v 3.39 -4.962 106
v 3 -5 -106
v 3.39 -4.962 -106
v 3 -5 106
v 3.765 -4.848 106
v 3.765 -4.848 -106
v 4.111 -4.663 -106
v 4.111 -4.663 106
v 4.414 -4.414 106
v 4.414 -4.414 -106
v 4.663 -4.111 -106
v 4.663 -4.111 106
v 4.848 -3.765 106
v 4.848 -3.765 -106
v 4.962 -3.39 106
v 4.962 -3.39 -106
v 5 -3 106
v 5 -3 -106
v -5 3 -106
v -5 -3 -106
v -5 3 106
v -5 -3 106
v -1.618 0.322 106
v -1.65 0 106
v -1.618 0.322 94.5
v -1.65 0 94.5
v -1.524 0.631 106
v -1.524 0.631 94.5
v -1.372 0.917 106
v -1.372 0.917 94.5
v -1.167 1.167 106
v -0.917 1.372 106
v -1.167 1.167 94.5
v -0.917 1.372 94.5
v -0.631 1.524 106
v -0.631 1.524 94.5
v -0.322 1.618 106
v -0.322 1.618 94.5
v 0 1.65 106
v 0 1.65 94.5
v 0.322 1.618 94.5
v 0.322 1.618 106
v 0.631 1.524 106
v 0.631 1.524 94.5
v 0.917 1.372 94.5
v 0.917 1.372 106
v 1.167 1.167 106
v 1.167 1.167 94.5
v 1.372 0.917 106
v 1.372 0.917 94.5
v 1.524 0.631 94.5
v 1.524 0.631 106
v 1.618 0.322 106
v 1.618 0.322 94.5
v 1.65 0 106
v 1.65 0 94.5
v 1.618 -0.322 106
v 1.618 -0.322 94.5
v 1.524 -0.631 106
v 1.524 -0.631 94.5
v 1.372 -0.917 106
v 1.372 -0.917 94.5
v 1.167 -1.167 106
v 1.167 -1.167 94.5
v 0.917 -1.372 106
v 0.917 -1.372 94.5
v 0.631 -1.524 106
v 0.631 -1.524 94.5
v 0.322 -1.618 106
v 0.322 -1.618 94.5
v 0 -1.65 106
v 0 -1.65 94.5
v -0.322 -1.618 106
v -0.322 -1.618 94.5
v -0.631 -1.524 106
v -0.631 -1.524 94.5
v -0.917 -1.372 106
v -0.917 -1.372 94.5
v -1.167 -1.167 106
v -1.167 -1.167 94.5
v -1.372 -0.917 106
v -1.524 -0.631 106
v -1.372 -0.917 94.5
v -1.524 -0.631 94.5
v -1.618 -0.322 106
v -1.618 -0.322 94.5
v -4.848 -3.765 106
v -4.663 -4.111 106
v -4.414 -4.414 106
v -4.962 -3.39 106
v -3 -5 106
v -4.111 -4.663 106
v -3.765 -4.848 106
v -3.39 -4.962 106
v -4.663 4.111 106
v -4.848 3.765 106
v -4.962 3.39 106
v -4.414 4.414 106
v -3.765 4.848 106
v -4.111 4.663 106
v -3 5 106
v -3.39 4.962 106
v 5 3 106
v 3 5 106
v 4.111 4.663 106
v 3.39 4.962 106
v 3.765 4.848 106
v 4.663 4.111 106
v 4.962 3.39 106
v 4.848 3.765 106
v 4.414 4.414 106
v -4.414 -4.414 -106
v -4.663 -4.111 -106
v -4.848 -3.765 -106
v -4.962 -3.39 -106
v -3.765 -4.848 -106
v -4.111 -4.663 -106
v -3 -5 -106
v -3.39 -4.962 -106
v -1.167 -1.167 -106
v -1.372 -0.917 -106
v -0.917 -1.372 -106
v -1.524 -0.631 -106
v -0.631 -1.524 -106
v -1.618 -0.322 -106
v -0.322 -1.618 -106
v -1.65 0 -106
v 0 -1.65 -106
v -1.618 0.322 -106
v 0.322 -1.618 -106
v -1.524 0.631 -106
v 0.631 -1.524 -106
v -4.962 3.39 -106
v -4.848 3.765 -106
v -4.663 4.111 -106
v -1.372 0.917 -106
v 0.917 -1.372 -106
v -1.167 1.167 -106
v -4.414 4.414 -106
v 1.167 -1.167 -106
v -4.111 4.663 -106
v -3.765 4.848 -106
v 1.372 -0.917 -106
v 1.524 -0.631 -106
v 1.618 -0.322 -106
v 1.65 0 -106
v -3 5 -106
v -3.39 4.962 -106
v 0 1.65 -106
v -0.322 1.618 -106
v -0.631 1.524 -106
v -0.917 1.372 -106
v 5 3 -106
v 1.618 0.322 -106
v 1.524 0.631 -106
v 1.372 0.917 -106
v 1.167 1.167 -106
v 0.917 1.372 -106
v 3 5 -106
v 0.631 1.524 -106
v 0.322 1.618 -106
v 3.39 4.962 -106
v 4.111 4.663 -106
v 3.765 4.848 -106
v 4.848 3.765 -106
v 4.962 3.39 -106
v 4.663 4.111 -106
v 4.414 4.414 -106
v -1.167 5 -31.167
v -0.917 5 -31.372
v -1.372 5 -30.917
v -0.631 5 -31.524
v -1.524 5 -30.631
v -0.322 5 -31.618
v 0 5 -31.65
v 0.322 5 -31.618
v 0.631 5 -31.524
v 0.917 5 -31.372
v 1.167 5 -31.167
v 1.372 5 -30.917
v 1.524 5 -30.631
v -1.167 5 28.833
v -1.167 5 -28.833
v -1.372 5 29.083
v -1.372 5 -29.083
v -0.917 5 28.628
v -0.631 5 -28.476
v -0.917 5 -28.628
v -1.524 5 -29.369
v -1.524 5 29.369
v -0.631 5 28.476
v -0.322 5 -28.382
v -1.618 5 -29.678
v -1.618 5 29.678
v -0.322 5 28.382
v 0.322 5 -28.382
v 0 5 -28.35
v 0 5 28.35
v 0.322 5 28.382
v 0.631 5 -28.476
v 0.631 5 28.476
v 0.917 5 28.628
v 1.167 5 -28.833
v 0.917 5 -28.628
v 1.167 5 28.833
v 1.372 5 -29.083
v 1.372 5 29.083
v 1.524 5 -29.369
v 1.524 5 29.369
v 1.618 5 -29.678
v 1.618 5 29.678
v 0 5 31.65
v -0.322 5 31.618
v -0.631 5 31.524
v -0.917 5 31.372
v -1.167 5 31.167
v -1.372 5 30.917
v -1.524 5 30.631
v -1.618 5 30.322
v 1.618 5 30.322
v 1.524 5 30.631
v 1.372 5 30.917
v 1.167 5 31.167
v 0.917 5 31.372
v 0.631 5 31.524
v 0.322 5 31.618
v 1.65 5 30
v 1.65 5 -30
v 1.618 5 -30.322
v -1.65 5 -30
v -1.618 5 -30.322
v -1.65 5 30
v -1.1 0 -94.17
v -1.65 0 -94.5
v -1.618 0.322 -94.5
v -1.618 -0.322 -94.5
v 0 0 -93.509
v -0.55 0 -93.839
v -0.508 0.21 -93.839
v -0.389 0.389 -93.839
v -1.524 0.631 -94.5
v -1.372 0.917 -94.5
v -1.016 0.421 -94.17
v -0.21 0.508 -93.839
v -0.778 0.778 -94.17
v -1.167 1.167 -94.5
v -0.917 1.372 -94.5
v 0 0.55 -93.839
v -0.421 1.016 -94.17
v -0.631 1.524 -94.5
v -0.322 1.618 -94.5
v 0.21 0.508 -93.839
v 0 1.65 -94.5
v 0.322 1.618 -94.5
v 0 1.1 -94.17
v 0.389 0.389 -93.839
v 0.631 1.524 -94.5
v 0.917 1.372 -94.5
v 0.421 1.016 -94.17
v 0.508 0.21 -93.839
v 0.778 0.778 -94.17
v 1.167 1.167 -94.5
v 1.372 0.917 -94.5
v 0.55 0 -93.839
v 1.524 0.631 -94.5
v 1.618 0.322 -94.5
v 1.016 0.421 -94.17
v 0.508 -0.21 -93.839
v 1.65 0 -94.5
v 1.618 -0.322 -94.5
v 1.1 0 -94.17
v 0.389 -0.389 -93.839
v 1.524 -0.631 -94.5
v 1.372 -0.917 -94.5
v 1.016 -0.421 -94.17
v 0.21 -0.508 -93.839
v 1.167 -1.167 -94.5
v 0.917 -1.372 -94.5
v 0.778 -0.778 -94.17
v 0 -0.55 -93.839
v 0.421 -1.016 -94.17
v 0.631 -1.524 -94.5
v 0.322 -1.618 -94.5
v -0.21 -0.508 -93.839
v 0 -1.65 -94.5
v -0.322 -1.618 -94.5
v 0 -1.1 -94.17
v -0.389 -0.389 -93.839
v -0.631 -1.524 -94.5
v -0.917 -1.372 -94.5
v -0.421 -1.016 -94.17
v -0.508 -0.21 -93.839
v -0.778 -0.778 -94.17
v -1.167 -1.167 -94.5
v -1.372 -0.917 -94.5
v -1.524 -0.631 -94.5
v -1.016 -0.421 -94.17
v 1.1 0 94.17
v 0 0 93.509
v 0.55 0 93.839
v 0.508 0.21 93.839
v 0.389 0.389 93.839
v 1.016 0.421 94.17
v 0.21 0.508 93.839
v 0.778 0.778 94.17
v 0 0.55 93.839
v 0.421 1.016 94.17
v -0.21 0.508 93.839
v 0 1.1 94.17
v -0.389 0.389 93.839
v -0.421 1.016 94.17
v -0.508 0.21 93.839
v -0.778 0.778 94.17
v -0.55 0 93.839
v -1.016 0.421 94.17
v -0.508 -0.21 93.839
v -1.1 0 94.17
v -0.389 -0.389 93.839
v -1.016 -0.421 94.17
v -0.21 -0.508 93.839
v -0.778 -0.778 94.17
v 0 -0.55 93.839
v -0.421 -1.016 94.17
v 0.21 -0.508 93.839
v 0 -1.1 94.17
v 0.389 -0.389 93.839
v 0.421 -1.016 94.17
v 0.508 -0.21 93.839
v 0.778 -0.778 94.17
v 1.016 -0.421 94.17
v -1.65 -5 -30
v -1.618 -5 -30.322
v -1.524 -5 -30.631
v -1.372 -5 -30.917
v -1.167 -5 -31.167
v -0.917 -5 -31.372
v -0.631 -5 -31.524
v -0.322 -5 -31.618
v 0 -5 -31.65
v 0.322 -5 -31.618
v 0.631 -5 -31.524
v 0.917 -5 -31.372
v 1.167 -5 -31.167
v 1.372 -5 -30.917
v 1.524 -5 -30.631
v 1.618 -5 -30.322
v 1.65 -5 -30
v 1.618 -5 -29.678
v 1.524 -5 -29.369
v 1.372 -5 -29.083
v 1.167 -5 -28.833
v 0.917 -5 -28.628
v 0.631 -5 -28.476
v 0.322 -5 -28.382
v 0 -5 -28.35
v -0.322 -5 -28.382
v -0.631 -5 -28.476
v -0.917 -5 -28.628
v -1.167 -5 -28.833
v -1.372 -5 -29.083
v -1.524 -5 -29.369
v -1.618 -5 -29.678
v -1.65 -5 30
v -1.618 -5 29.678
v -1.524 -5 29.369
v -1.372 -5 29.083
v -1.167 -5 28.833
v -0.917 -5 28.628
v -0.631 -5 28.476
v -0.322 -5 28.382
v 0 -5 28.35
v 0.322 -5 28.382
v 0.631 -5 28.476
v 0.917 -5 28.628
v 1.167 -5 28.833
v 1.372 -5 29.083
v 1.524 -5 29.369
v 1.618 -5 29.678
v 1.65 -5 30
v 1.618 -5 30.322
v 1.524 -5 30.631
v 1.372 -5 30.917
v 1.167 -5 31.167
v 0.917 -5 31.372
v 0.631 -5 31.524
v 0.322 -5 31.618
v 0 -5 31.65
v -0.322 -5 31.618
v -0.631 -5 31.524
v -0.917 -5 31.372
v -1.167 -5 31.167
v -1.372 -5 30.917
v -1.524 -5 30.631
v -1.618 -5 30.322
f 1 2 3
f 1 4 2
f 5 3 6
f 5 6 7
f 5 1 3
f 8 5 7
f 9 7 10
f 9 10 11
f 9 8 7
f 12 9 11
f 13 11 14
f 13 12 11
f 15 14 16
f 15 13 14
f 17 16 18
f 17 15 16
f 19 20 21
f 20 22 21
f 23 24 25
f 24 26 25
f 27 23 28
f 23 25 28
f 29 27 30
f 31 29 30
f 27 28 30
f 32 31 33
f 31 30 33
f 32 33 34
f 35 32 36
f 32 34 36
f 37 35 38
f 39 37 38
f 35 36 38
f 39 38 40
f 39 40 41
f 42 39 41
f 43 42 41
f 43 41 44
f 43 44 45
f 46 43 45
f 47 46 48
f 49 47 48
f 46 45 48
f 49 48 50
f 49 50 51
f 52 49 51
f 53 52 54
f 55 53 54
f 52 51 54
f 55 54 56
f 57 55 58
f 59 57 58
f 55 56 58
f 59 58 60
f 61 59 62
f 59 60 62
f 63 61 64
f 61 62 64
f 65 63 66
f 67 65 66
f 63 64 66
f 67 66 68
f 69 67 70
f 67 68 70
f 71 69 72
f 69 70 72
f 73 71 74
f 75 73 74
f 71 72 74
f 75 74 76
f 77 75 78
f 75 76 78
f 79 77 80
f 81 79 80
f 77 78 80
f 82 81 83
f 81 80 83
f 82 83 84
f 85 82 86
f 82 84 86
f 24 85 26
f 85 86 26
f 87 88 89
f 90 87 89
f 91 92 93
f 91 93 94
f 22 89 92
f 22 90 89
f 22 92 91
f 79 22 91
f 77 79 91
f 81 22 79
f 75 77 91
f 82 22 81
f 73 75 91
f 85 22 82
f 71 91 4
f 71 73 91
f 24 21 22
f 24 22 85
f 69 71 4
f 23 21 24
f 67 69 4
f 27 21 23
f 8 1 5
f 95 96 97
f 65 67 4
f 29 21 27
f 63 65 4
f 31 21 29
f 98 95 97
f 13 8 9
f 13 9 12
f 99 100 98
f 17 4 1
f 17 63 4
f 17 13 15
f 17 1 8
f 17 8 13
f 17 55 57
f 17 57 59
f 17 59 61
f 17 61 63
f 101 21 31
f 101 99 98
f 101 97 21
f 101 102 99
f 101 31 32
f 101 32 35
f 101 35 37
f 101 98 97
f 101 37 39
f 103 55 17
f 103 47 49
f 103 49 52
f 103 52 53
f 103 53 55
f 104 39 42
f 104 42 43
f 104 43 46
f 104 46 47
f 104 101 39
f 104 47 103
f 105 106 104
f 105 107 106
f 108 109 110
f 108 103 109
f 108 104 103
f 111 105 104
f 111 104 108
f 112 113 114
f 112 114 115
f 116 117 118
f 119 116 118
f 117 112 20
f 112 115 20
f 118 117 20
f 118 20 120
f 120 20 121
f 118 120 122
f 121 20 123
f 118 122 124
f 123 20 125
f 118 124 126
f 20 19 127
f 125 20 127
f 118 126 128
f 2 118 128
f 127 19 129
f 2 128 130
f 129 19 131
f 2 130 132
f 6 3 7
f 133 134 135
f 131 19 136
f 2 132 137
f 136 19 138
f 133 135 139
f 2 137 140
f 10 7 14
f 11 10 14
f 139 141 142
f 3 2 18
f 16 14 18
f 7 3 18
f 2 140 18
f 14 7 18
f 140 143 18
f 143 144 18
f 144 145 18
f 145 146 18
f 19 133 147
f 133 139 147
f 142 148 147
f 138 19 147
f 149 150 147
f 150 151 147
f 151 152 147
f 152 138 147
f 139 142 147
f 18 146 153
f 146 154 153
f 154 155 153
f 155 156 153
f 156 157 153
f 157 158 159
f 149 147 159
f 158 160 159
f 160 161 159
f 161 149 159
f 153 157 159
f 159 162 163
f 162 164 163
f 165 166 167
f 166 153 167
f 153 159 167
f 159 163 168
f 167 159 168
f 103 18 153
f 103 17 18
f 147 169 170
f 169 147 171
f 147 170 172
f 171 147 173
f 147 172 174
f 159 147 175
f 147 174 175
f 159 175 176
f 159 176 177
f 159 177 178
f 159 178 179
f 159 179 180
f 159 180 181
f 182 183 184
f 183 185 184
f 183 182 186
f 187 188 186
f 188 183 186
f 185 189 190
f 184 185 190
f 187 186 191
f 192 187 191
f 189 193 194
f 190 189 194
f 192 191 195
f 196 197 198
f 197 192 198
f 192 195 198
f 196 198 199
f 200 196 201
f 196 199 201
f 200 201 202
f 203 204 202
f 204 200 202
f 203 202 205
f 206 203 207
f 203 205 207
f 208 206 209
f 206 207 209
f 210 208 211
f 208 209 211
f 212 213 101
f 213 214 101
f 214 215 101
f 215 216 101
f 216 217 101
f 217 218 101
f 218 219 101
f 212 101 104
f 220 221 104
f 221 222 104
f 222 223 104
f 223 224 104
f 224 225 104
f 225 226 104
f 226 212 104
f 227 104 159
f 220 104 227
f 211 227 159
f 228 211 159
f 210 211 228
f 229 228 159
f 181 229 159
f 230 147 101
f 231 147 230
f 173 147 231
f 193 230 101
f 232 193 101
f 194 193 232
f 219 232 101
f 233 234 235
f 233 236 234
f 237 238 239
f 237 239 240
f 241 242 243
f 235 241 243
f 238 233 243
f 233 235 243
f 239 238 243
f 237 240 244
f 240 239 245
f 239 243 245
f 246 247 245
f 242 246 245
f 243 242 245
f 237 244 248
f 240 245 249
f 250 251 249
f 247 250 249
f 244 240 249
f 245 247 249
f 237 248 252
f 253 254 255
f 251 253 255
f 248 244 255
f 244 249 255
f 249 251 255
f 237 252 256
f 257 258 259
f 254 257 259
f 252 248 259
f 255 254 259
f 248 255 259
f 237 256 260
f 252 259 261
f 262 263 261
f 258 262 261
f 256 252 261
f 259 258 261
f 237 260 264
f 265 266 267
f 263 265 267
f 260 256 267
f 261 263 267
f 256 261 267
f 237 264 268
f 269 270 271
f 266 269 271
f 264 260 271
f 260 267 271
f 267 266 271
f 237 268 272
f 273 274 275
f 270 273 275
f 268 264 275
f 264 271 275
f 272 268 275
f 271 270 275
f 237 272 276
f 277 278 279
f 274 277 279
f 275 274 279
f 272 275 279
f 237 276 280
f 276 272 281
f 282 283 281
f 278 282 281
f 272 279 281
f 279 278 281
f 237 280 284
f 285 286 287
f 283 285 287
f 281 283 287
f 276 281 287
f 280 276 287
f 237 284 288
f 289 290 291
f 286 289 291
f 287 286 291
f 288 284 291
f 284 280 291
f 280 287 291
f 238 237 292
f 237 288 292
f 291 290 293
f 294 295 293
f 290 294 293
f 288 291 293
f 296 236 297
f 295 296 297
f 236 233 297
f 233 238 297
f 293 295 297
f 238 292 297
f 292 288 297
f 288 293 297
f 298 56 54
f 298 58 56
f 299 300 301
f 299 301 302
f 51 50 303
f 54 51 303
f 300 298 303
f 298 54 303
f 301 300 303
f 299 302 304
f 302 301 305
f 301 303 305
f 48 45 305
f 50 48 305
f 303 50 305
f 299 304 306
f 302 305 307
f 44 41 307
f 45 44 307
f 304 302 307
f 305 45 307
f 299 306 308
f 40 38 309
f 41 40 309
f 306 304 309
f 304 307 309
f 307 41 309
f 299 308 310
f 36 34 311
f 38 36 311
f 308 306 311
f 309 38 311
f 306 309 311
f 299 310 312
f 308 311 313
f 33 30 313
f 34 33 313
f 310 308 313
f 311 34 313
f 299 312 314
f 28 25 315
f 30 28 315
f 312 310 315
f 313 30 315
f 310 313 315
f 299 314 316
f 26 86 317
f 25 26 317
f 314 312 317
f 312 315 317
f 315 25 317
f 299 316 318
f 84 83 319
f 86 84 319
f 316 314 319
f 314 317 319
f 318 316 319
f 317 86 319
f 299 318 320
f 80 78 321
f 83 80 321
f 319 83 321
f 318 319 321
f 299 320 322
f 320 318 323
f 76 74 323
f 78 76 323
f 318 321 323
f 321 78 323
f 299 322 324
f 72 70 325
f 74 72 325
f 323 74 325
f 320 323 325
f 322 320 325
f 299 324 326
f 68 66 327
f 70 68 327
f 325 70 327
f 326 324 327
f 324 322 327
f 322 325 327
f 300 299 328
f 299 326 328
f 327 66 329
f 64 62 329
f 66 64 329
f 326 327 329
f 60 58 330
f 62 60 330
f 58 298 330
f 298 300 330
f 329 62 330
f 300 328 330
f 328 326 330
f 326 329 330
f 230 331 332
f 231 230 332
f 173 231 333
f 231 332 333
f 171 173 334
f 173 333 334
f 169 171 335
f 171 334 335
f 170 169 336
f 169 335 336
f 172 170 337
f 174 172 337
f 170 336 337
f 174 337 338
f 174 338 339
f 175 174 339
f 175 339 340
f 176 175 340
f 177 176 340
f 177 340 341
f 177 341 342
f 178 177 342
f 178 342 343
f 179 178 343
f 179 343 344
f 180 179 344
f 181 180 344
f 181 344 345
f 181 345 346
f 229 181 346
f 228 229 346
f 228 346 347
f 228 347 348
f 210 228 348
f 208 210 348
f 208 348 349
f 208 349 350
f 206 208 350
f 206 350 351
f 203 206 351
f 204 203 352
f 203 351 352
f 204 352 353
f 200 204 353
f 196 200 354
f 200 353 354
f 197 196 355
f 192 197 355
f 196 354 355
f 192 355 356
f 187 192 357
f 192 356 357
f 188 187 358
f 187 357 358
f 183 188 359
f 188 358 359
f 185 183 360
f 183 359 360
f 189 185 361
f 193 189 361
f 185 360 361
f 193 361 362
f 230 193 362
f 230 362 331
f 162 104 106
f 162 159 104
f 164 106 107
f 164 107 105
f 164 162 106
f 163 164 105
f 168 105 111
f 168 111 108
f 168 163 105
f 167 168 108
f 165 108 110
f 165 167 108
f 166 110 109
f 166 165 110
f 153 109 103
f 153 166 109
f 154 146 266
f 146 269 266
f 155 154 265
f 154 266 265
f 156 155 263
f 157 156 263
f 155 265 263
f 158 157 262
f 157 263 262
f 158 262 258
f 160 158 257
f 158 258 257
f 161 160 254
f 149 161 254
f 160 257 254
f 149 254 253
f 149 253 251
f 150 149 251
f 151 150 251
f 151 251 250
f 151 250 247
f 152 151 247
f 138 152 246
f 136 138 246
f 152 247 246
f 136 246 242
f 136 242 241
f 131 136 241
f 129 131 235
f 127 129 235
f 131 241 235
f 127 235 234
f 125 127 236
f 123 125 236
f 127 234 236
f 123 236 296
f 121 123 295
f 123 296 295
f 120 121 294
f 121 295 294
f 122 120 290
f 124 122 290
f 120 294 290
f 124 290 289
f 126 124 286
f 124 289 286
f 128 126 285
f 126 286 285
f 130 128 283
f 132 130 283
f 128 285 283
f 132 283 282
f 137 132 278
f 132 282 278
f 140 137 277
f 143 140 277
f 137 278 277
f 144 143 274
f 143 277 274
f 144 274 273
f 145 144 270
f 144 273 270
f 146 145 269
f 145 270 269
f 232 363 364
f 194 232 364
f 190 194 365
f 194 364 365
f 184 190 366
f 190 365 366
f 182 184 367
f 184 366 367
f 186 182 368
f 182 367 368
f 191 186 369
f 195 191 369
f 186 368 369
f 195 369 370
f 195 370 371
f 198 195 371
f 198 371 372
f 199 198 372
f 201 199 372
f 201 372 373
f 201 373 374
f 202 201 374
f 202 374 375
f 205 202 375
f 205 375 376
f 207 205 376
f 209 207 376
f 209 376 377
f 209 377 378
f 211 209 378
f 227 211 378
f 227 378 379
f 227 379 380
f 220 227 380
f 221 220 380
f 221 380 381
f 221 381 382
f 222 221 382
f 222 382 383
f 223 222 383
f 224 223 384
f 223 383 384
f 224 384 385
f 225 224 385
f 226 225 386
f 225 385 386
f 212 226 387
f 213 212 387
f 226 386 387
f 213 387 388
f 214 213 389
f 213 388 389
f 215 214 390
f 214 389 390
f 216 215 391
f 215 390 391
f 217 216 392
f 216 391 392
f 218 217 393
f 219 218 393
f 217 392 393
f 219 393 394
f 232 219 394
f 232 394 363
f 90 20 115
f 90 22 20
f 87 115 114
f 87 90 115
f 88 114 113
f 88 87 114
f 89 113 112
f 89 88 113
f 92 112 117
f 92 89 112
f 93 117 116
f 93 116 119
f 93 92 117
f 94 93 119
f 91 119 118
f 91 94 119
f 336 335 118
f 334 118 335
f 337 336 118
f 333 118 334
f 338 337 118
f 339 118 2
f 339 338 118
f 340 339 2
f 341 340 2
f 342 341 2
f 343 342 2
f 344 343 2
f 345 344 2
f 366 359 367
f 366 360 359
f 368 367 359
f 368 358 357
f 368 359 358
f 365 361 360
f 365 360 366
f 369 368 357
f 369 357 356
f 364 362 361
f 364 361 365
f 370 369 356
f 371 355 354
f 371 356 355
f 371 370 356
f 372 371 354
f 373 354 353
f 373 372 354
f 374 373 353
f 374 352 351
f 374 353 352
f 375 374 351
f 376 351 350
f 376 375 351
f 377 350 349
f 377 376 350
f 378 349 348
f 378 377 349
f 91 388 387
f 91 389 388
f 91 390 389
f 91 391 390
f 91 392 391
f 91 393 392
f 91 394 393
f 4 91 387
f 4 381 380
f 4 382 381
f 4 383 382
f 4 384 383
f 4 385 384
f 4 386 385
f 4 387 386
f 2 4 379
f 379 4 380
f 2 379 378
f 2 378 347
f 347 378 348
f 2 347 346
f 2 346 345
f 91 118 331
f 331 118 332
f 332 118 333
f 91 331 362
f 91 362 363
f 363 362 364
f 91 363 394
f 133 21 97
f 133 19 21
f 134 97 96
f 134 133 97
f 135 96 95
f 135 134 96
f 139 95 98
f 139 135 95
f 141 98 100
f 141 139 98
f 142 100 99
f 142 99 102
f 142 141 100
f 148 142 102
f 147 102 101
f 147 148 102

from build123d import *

# Parameters (mm, degrees)
ESQUISSE1_W           = 10
ESQUISSE1_H           = 10
BOSS_EXTRU_1_DEPTH    = 106
TROU_TARAUD_M41_D     = 3.3
TROU_TARAUD_M41_DEPTH = 11.5
TROU_TARAUD_M41_TIP   = 0.991420021
TROU_TARAUD_M42_D     = 3.3
TROU_TARAUD_M42_DEPTH = 11.5
TROU_TARAUD_M42_TIP   = 0.991420021
CONG_1_R              = 2
TROU_TARAUD_M44_D     = 3.3


with BuildPart() as part:
    # Esquisse1 → Boss.-Extru.1 (new, symmetric)
    with BuildSketch(Plane.XY):
        Rectangle(ESQUISSE1_W, ESQUISSE1_H)
    extrude(amount=BOSS_EXTRU_1_DEPTH, both=True)

    # Trou taraudé M41
    with Locations(Plane.XY.offset(106)):
        with Locations((0, 0)):
            Hole(TROU_TARAUD_M41_D / 2, depth=TROU_TARAUD_M41_DEPTH)
            with Locations((0, 0, -(TROU_TARAUD_M41_DEPTH + TROU_TARAUD_M41_TIP / 2))):  # 118° drill point
                Cone(0, TROU_TARAUD_M41_D / 2, TROU_TARAUD_M41_TIP, mode=Mode.SUBTRACT)

    # Trou taraudé M42
    with Locations(Plane(origin=(0, 0, -106), x_dir=(-1, 0, 0), z_dir=(0, 0, -1))):
        with Locations((0, 0)):
            Hole(TROU_TARAUD_M42_D / 2, depth=TROU_TARAUD_M42_DEPTH)
            with Locations((0, 0, -(TROU_TARAUD_M42_DEPTH + TROU_TARAUD_M42_TIP / 2))):  # 118° drill point
                Cone(0, TROU_TARAUD_M42_D / 2, TROU_TARAUD_M42_TIP, mode=Mode.SUBTRACT)

    # Congé1
    cong_1_edges = [part.edges().sort_by_distance(p)[0] for p in [
        (-5, 5, 0),
        (5, 5, 0),
        (5, -5, 0),
        (-5, -5, 0),
    ]]
    fillet(cong_1_edges, radius=CONG_1_R)

    # Trou taraudé M44 (through all)
    with Locations(Plane(origin=(0, 5, 0), x_dir=(1, 0, 0), z_dir=(0, 1, 0))):
        with Locations((0, -30), (0, 30)):
            Hole(TROU_TARAUD_M44_D / 2)


solid = part.part
